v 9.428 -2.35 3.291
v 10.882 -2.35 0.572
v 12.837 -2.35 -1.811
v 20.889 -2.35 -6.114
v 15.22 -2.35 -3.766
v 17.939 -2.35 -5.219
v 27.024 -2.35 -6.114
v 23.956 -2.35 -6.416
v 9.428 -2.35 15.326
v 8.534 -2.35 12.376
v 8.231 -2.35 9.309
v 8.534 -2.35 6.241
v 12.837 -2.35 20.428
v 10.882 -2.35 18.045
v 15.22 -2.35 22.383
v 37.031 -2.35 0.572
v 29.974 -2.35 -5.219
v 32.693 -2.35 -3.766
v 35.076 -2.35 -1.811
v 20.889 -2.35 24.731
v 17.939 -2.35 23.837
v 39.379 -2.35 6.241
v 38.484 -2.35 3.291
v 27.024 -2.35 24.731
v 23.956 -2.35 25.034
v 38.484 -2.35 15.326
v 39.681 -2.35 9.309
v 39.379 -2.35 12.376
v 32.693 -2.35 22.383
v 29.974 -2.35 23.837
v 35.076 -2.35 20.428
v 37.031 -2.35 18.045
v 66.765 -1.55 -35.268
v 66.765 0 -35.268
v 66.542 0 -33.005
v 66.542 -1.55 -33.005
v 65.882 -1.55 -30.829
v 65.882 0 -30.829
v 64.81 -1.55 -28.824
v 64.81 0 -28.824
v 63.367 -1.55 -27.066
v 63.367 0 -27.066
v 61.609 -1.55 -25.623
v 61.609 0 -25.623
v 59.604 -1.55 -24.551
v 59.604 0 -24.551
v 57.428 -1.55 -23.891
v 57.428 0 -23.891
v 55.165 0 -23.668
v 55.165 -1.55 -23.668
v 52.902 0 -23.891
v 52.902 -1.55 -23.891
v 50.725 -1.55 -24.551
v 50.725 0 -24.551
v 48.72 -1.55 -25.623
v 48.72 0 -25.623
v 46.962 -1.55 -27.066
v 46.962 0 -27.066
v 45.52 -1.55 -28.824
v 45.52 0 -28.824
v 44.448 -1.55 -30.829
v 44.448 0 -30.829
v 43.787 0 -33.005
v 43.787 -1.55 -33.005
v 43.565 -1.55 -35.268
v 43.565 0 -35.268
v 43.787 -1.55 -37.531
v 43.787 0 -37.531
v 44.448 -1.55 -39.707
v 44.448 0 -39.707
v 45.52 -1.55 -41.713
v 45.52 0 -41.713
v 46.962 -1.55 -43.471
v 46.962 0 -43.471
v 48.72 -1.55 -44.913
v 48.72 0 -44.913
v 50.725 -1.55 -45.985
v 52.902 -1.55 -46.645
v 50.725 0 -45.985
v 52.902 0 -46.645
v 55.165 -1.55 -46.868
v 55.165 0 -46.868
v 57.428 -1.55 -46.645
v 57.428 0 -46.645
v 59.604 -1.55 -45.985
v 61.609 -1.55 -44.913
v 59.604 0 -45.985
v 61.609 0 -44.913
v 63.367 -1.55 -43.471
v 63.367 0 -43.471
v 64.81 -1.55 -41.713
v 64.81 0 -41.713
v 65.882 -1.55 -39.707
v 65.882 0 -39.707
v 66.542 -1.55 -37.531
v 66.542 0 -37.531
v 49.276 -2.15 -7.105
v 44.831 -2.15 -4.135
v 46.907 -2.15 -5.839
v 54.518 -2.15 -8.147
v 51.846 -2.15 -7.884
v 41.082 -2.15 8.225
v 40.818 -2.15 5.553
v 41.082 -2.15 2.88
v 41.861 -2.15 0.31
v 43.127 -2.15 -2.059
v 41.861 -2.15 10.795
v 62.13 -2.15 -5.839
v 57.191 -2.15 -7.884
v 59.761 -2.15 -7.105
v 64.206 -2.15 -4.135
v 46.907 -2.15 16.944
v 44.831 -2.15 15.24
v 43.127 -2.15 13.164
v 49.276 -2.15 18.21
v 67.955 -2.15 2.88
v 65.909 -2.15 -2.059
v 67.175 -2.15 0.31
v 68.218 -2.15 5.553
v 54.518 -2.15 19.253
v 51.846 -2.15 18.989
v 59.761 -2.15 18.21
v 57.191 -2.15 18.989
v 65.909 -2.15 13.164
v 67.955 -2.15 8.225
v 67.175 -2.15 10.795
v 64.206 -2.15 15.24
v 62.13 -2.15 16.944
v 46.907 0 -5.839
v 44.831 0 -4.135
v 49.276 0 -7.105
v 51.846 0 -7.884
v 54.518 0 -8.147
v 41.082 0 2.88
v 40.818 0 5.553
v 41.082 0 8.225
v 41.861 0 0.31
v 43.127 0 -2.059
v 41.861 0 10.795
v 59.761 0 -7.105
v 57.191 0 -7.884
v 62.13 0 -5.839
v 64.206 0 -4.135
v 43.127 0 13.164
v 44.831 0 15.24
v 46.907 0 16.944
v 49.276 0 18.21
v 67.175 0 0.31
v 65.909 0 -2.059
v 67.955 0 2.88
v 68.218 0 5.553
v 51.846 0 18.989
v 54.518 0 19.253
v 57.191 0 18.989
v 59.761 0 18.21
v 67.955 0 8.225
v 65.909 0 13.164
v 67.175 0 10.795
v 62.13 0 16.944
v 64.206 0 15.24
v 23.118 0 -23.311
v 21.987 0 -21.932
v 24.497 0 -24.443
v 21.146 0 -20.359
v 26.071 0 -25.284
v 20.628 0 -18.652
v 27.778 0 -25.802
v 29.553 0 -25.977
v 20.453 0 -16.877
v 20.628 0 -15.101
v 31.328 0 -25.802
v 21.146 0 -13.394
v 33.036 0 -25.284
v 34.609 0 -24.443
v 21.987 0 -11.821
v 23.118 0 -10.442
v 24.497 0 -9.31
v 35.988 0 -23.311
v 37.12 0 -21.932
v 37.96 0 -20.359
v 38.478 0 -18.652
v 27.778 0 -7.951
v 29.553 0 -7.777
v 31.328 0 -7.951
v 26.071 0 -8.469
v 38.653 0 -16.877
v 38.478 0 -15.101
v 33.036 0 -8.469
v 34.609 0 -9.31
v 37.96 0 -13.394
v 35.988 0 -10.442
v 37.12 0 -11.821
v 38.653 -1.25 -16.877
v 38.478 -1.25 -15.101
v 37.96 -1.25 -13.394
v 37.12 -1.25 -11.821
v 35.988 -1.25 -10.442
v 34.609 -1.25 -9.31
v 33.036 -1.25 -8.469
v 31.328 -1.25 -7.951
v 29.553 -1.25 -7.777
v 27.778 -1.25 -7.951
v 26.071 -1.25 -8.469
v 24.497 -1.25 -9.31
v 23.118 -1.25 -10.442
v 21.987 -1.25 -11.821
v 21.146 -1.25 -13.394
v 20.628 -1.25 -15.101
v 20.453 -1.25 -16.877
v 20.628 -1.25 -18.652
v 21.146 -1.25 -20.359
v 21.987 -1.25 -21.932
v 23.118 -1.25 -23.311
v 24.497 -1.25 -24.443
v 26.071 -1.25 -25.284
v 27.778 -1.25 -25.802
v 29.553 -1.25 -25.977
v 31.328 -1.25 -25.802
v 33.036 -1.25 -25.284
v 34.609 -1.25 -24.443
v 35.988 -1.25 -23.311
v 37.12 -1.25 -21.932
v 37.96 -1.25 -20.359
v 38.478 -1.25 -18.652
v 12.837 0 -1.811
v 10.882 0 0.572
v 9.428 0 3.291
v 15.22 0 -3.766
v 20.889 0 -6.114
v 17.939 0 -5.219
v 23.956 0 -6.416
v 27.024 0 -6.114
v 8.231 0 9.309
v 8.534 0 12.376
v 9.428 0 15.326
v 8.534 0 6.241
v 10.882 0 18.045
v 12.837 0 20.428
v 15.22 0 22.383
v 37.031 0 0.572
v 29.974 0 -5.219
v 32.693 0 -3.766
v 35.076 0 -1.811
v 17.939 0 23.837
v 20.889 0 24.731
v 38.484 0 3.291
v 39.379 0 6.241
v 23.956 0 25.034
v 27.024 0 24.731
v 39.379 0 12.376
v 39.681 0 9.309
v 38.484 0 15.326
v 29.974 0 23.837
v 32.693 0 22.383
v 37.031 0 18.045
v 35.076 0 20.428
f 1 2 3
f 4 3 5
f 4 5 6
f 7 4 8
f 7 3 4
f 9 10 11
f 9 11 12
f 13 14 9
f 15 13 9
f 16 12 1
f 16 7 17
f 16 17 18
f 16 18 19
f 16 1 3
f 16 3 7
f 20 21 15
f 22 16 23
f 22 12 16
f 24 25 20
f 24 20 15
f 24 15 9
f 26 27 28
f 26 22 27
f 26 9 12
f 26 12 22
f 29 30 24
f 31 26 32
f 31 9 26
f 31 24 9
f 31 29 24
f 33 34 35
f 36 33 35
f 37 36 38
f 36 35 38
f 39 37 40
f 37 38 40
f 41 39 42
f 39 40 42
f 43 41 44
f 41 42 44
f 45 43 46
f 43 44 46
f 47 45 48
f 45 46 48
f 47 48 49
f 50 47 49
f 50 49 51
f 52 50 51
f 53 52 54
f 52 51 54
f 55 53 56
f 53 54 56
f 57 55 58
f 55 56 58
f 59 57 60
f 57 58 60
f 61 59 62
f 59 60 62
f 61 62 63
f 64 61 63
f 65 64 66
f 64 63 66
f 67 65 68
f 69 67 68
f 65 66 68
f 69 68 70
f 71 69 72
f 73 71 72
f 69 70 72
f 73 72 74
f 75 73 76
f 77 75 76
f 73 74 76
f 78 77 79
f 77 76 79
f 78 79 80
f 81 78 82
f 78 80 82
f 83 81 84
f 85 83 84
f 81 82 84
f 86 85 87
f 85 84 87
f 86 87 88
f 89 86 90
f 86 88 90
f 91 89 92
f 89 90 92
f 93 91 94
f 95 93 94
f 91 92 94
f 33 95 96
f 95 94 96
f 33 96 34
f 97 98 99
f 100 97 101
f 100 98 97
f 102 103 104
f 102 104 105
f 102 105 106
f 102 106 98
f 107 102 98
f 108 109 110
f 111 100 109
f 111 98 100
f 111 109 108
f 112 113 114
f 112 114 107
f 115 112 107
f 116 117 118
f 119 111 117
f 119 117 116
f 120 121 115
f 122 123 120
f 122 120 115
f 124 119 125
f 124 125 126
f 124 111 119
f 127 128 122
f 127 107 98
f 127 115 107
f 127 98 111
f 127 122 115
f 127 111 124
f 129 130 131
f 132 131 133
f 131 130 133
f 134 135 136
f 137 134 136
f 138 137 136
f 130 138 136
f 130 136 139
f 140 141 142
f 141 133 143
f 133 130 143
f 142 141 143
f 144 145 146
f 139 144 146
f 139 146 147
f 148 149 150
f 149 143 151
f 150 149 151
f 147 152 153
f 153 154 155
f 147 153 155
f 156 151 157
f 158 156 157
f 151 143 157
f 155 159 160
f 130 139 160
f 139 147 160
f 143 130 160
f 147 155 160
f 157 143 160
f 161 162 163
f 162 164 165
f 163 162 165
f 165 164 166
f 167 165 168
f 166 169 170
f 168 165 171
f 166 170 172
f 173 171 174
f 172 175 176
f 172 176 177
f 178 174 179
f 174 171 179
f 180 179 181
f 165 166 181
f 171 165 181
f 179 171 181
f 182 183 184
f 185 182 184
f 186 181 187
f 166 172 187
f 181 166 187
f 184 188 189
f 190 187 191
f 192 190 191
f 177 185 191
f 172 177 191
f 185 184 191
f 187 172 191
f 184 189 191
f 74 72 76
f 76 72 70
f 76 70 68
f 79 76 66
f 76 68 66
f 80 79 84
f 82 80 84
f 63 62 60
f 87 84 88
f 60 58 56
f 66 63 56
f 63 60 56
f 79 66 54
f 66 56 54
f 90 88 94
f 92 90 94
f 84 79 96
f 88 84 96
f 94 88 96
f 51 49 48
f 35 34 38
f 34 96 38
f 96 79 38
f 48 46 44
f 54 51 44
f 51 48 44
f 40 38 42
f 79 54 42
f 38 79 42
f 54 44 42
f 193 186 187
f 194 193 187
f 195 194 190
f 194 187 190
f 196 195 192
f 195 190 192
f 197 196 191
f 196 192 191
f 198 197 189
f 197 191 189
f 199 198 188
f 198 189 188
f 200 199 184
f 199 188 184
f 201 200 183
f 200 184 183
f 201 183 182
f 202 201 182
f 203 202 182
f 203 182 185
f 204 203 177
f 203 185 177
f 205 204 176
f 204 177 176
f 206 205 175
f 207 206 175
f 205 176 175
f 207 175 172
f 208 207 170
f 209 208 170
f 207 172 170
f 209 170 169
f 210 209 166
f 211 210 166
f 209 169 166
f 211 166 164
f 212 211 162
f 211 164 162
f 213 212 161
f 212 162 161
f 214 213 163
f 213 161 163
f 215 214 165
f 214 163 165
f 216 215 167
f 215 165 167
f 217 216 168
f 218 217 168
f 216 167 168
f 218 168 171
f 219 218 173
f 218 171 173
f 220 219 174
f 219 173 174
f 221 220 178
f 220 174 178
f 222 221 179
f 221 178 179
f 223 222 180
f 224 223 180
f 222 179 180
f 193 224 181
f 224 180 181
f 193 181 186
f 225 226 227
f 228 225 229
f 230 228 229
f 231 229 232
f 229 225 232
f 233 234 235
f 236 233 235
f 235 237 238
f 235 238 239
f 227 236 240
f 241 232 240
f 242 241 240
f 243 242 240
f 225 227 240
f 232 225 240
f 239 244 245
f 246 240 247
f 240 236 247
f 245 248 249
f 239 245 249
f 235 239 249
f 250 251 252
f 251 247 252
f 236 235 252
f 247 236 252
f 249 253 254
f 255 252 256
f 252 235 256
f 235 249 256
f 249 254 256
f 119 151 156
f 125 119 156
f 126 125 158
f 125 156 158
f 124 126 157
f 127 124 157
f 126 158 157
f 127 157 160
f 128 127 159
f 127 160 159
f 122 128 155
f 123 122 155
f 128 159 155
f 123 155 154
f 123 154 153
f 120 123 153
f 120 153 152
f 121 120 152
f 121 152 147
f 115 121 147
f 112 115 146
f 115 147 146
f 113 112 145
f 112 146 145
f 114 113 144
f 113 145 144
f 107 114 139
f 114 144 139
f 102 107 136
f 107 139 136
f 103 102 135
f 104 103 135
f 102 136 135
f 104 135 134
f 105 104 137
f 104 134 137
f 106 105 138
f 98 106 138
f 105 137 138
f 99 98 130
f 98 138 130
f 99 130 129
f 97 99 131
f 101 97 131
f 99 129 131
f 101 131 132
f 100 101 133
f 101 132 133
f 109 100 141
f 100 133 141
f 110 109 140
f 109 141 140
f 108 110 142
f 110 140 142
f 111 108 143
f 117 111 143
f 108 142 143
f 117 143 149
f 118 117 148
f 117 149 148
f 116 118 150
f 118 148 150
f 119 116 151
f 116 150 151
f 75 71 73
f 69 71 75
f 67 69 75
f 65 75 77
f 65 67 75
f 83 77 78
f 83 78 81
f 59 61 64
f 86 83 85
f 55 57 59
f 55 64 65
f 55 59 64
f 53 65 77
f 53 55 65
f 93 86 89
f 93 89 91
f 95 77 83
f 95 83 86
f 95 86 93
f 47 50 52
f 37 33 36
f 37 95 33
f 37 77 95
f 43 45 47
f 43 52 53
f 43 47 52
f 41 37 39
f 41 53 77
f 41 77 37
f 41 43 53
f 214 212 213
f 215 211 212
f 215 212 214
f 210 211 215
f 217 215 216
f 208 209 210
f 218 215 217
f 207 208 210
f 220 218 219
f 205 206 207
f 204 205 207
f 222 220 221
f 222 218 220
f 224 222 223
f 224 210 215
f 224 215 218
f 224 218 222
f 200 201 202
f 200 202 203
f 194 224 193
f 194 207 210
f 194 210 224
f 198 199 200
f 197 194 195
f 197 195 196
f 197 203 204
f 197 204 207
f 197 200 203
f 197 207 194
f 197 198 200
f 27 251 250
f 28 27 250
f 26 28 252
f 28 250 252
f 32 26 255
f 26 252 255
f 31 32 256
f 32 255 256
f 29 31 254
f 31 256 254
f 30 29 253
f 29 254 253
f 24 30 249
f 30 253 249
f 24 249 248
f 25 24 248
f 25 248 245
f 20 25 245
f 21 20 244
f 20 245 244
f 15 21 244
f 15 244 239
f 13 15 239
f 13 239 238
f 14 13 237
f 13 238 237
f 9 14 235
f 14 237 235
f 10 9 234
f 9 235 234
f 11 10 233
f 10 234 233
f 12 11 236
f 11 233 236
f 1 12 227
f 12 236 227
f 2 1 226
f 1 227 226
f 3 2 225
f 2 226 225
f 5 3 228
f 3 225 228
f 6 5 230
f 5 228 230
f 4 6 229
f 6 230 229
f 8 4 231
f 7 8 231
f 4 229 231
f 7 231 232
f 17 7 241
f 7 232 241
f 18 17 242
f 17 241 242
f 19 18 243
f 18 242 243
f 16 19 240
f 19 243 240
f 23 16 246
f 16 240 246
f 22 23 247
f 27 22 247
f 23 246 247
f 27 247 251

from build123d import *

# Parameters (mm, degrees)
F0_R     = 15.725
F1_DEPTH = 2.35
F2_R     = 13.7
F3_DEPTH = 2.15
F4_R     = 11.6
F5_DEPTH = 1.55
F6_R     = 9.1
F7_DEPTH = 1.25


with BuildPart() as f1:
    # F0 (on Front) → F1 (new body)
    with BuildSketch(Plane.XZ):
        with Locations((23.956396, 9.308519)):
            Circle(F0_R)
    extrude(amount=F1_DEPTH)


with BuildPart() as f3:
    # F2 (on Front) → F3 (new body)
    with BuildSketch(Plane.XZ):
        with Locations((54.518301, 5.552593)):
            Circle(F2_R)
    extrude(amount=F3_DEPTH)


with BuildPart() as f5:
    # F4 (on Front) → F5 (new body)
    with BuildSketch(Plane.XZ):
        with Locations((55.164609, -35.268139)):
            Circle(F4_R)
    extrude(amount=F5_DEPTH)


with BuildPart() as f7:
    # F6 (on Front) → F7 (new body)
    with BuildSketch(Plane.XZ):
        with Locations((29.553156, -16.876528)):
            Circle(F6_R)
    extrude(amount=F7_DEPTH)


solid = Compound([f1.part, f3.part, f5.part, f7.part])
